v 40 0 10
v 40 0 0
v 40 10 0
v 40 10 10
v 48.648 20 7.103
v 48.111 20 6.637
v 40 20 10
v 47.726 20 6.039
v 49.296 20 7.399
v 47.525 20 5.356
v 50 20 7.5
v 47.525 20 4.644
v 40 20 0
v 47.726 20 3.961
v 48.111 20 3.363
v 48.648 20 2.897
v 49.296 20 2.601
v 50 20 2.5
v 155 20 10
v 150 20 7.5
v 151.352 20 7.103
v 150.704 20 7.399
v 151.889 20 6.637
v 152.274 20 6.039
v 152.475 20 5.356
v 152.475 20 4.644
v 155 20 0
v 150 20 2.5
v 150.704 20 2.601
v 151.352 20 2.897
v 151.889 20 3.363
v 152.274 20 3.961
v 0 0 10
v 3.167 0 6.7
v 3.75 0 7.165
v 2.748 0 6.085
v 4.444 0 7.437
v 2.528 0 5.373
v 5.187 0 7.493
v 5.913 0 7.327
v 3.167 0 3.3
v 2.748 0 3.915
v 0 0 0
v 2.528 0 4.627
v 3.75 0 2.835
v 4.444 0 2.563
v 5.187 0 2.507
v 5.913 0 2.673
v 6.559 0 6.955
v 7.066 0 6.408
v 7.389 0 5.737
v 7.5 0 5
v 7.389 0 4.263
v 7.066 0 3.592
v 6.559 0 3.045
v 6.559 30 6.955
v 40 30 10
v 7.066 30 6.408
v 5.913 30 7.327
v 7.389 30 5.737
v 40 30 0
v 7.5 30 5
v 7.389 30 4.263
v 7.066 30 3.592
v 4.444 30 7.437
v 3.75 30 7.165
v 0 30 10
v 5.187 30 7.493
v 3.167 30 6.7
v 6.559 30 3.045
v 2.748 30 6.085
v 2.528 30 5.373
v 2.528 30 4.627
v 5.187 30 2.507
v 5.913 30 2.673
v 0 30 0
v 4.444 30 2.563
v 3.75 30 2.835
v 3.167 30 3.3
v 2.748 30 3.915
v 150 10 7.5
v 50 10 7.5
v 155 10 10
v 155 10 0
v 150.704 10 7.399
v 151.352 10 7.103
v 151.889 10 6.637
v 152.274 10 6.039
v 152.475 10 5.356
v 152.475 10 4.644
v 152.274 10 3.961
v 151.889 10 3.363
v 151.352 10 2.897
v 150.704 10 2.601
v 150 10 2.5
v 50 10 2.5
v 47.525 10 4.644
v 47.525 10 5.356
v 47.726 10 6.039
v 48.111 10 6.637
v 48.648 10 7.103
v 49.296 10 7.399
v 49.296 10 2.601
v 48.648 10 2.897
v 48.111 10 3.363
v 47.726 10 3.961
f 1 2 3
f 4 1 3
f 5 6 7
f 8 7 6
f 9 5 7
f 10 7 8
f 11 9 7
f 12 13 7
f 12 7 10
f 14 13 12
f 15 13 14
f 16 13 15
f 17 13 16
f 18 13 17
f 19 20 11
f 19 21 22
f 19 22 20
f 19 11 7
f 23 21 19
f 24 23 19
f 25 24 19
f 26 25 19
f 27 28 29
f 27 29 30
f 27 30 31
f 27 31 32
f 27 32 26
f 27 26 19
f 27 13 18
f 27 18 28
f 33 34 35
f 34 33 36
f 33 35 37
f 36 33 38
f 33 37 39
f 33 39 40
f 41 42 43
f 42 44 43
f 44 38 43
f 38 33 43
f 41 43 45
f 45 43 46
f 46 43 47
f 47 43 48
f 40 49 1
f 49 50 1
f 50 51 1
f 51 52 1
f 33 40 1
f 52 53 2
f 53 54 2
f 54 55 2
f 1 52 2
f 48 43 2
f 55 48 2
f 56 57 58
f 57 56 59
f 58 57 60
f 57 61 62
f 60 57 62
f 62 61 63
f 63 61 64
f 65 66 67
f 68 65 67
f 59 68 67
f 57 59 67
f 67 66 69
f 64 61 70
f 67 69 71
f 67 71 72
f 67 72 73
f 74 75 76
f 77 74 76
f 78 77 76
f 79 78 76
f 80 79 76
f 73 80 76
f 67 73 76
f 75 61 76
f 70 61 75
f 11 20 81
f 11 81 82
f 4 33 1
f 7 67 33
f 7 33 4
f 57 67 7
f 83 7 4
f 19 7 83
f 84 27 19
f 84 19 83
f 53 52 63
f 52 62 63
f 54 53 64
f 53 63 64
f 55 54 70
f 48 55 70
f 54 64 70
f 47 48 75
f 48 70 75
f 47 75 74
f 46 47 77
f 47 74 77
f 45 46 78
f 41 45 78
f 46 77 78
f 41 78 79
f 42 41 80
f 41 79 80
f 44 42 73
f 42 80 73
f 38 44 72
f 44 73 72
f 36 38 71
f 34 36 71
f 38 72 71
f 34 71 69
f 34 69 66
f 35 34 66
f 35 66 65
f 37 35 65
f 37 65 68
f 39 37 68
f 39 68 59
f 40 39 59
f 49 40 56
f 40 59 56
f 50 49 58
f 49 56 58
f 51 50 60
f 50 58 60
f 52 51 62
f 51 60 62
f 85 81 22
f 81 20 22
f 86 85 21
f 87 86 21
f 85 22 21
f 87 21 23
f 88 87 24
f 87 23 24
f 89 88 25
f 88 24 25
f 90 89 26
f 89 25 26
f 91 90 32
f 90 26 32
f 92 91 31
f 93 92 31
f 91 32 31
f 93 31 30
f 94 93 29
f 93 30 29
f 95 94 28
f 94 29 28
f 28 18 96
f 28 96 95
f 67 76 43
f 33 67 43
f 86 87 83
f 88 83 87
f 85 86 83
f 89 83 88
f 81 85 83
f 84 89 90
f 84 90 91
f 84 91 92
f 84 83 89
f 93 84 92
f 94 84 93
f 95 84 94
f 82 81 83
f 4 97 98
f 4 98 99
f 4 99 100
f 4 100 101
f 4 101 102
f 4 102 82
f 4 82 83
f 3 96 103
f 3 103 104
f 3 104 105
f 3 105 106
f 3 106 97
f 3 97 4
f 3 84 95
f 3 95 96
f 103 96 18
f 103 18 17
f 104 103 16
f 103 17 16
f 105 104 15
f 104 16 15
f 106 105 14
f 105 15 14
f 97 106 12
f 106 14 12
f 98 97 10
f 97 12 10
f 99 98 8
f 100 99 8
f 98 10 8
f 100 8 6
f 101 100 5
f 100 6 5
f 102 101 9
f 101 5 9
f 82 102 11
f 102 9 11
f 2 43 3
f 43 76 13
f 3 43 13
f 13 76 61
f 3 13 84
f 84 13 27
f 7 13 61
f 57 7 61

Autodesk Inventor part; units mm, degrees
ref_plane "YZ Plane" through (0, 0, 0) normal (1, 0, 0) x (0, 1, 0)
ref_plane "XZ Plane" through (0, 0, 0) normal (0, 1, 0) x (-1, 0, 0)
ref_plane "XY Plane" through (0, 0, 0) normal (0, 0, 1) x (1, 0, 0)
sketch "Sketch1" plane through (0, 0, 0) normal (0, 0, 1) x (1, 0, 0)
  line L0 (0, 0) -> (40, 0)
  line L1 (40, 0) -> (40, 30)
  line L2 (40, 30) -> (0, 30)
  line L3 (0, 30) -> (0, 0)
  line L4 (40, 20) -> (155, 20)
  line L5 (155, 20) -> (155, 10)
  line L6 (155, 10) -> (40, 10)
  line L7 (40, 10) -> (40, 20)
  point P0 (40, 10)
  dimension "d0" = 30
  dimension "d1" = 40
  dimension "d2" = 10
  dimension "d3" = 115
  dimension "d4" = 10
extrude "Extrusion1" add sketch "Sketch1" along normal blind 10
sketch "Sketch2" plane through (40, 20, 0) normal (0, 1, 0) x (1, 0, 0)
  circle A0 centre (110, -5) radius 2.5
  circle A1 centre (10, -5) radius 2.5
  line L0 (115, 0) -> (115, -10) projected
  line L1 (115, -10) -> (0, -10) projected
  line L2 (0, 0) -> (0, -10) projected
  line L3 (110, -7.5) -> (10, -7.5)
  line L4 (10, -7.5) -> (10, -2.5)
  line L5 (10, -2.5) -> (110, -2.5)
  line L6 (110, -2.5) -> (110, -7.5)
  point P0 (-40, 0)
  point P1 (110, -2.5)
  point P2 (10, -7.5)
  point P3 (10, -7.5)
  dimension "d8" = 5
  dimension "d12" = 5
  dimension "d9" = 5
  dimension "d10" = 5
  dimension "d11" = 10
  dimension "d14" = 2.5
  dimension "d22" = 100
  dimension "d23" = 5
extrude "Extrusion2" cut sketch "Sketch2" against normal blind 10
sketch "Sketch3" plane through (0, 30, 0) normal (0, 1, 0) x (1, 0, 0)
  circle A0 centre (5, -5) radius 2.5
  line L0 (0, 0) -> (0, -10) projected
  line L1 (40, 0) -> (0, 0) projected
  dimension "d17" = 5
  dimension "d18" = 5
  dimension "d19" = 5
extrude "Extrusion3" cut sketch "Sketch3" against normal blind 30
properties part number "Top Piece"
